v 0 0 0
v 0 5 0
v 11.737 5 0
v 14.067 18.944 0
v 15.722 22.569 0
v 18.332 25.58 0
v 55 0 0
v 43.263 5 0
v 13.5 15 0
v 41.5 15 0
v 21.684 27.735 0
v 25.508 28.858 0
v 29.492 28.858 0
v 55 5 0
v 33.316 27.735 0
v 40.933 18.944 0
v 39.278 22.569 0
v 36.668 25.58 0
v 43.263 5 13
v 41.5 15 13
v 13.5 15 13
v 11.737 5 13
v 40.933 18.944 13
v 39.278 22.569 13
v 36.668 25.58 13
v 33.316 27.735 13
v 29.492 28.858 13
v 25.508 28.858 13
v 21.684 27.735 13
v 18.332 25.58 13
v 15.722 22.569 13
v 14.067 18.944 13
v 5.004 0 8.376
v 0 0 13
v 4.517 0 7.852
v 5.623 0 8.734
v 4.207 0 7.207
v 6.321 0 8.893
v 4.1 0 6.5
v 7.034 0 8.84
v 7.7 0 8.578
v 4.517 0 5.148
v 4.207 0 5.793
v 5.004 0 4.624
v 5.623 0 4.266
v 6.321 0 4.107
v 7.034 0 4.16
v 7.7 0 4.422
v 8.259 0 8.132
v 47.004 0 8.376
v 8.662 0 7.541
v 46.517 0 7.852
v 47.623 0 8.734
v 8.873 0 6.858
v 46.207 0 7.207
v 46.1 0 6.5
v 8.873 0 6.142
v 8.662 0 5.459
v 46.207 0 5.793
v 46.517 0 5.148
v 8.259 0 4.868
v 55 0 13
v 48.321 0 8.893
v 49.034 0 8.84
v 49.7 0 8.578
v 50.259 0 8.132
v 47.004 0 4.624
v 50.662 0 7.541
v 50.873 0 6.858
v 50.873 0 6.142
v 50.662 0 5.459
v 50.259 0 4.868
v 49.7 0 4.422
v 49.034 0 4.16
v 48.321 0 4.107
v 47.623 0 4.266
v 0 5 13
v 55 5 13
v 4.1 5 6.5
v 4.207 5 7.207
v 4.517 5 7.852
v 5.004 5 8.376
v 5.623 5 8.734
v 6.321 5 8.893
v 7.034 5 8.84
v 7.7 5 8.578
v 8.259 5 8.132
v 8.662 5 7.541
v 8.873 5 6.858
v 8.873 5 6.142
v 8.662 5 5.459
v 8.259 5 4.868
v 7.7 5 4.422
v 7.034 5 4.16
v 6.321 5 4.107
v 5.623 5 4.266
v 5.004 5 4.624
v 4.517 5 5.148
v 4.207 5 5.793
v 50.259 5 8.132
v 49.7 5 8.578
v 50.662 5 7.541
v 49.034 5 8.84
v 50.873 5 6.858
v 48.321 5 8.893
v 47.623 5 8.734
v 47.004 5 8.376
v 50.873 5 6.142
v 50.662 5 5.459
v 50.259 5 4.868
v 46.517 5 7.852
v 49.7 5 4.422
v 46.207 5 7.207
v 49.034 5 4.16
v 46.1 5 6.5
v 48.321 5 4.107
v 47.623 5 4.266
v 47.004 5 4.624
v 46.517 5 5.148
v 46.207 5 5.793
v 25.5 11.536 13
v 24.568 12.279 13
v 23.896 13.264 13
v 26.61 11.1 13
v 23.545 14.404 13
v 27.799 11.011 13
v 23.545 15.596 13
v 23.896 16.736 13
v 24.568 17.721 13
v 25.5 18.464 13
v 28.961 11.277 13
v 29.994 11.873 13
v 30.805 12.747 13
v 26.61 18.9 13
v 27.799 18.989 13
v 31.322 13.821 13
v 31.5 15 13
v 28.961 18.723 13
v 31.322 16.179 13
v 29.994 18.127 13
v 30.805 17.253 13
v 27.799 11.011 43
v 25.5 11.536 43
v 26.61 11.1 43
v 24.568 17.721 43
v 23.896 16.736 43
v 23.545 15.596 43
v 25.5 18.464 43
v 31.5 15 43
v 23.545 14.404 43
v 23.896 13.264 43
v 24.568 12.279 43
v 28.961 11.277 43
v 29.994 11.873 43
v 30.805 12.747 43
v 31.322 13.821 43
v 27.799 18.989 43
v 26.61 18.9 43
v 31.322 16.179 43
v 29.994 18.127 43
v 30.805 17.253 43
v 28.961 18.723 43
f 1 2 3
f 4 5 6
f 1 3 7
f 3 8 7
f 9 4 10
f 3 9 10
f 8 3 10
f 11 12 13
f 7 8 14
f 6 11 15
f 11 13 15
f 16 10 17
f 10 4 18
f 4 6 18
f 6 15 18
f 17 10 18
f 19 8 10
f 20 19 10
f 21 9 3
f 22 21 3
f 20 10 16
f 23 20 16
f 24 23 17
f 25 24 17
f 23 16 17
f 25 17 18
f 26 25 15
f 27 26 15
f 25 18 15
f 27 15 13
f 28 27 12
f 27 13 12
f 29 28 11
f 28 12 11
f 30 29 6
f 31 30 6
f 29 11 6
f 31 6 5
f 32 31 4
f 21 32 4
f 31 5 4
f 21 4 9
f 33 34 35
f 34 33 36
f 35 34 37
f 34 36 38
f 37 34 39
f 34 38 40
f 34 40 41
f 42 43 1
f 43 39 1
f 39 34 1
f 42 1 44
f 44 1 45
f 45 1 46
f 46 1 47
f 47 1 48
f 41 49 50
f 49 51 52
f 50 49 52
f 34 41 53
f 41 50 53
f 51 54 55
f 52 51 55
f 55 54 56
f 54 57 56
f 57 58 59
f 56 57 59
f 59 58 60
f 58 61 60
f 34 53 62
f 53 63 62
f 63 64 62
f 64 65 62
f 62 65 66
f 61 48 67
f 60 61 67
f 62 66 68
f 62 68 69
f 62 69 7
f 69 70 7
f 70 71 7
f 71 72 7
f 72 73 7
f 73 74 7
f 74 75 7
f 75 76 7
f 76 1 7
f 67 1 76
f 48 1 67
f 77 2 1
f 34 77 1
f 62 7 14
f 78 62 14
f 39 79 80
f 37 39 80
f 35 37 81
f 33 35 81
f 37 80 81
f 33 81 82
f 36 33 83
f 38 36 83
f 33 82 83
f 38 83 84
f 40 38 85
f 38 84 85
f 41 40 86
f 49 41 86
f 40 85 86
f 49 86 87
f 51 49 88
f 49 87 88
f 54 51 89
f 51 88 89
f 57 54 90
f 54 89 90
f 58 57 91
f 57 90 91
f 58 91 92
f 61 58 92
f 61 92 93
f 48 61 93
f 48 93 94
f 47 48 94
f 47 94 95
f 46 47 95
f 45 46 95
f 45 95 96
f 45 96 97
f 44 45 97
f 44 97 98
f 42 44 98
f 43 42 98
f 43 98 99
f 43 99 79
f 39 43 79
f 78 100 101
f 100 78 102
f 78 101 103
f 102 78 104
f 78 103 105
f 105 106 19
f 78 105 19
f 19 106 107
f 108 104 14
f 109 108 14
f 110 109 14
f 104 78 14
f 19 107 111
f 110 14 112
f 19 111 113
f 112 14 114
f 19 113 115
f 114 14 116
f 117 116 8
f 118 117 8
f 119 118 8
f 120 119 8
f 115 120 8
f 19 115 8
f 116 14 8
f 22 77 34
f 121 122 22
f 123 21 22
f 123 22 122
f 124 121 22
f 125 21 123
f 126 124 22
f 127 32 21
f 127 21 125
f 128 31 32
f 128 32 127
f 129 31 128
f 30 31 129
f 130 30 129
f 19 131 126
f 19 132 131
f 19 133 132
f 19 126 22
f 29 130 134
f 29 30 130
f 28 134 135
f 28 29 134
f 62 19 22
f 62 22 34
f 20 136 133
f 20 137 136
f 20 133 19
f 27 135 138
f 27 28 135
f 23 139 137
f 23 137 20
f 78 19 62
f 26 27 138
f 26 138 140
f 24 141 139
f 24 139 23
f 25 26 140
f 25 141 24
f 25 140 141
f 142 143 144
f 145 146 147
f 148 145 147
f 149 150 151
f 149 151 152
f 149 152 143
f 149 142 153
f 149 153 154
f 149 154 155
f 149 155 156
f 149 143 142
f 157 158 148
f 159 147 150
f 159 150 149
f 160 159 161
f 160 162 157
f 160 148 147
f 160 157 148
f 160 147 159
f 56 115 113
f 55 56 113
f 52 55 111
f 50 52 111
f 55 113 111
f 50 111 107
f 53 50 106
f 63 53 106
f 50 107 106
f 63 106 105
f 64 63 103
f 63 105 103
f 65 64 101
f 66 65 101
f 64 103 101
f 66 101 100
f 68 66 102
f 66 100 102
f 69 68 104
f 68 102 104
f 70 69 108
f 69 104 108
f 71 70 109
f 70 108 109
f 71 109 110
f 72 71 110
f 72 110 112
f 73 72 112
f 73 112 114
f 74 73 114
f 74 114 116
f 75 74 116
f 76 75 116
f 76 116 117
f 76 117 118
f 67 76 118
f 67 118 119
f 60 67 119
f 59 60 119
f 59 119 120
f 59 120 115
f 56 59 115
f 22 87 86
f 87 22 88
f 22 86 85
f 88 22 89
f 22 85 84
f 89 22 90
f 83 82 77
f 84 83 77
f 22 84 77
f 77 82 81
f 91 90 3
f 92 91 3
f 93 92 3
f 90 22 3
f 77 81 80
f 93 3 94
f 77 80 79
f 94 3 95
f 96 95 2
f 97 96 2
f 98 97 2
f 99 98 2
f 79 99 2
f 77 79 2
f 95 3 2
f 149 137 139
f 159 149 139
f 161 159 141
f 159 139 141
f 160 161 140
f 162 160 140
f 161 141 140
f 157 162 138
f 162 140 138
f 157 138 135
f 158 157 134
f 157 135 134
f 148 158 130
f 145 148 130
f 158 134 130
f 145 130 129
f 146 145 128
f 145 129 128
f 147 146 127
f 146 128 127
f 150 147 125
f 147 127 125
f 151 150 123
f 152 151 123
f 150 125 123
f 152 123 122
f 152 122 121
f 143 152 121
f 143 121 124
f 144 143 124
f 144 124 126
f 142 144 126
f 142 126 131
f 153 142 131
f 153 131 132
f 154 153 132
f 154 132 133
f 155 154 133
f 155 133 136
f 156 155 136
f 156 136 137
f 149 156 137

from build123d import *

# Parameters (mm, degrees)
EXTRUDE_1_DEPTH      = 13
SKETCH_2_R           = 4
CUT_EXTRUDE_1_DEPTH  = 13
CUT_EXTRUDE_2_REACH  = 63.4
SKETCH_3_R           = 2.4
EXTRUDE_2_DEPTH      = 30
EXTRUDE_2_DEPTH_BACK = 13
SKETCH_4_R           = 4


with BuildPart() as part:
    # 草图1 → 凸台-拉伸1 (new body)
    with BuildSketch(Plane.XY):
        with BuildLine():
            Line((0, 0), (55, 0))
            Line((55, 0), (55, 5))
            Line((55, 5), (43.263269807, 5))
            Line((43.263269807, 5), (41.5, 15))
            ThreePointArc((41.5, 15), (27.5, 29), (13.5, 15))
            Line((13.5, 15), (11.736730193, 5))
            Line((11.736730193, 5), (0, 5))
            Line((0, 5), (0, 0))
        make_face()
    extrude(amount=EXTRUDE_1_DEPTH)

    # 草图2 → 切除-拉伸1 (cut)
    with BuildSketch(Plane.XY.offset(13)):
        with Locations((27.5, 15)):
            Circle(SKETCH_2_R)
    extrude(amount=-CUT_EXTRUDE_1_DEPTH, mode=Mode.SUBTRACT)

    # 草图3 → 切除-拉伸2 (cut, up to next)
    with BuildSketch(Plane(origin=(0, 5, 0), x_dir=(1, 0, 0), z_dir=(0, 1, 0)), mode=Mode.PRIVATE) as cut_extrude_2_sk1:
        with Locations(Location((6.5, -6.5, 0), (0, 0, 180))):
            Circle(SKETCH_3_R)
    cut_extrude_2_tool1 = extrude(cut_extrude_2_sk1.sketch, amount=-CUT_EXTRUDE_2_REACH, mode=Mode.PRIVATE) & part.part
    # 草图3 → 切除-拉伸2 (cut, up to next)
    with BuildSketch(Plane(origin=(0, 5, 0), x_dir=(1, 0, 0), z_dir=(0, 1, 0)), mode=Mode.PRIVATE) as cut_extrude_2_sk2:
        with Locations(Location((48.5, -6.5, 0), (0, 0, 180))):
            Circle(SKETCH_3_R)
    cut_extrude_2_tool2 = extrude(cut_extrude_2_sk2.sketch, amount=-CUT_EXTRUDE_2_REACH, mode=Mode.PRIVATE) & part.part
    add(cut_extrude_2_tool1.solids().sort_by_distance((6.5, 5, 6.5))[0], mode=Mode.SUBTRACT)
    add(cut_extrude_2_tool2.solids().sort_by_distance((48.5, 5, 6.5))[0], mode=Mode.SUBTRACT)

    # 草图4 → 凸台-拉伸2 (add, two sides: drawn at the far end of the back side and taken through both)
    with BuildSketch(Plane.XY.offset(13).offset(-EXTRUDE_2_DEPTH_BACK)):
        with Locations((27.5, 15)):
            Circle(SKETCH_4_R)
    extrude(amount=EXTRUDE_2_DEPTH + EXTRUDE_2_DEPTH_BACK)


solid = part.part
